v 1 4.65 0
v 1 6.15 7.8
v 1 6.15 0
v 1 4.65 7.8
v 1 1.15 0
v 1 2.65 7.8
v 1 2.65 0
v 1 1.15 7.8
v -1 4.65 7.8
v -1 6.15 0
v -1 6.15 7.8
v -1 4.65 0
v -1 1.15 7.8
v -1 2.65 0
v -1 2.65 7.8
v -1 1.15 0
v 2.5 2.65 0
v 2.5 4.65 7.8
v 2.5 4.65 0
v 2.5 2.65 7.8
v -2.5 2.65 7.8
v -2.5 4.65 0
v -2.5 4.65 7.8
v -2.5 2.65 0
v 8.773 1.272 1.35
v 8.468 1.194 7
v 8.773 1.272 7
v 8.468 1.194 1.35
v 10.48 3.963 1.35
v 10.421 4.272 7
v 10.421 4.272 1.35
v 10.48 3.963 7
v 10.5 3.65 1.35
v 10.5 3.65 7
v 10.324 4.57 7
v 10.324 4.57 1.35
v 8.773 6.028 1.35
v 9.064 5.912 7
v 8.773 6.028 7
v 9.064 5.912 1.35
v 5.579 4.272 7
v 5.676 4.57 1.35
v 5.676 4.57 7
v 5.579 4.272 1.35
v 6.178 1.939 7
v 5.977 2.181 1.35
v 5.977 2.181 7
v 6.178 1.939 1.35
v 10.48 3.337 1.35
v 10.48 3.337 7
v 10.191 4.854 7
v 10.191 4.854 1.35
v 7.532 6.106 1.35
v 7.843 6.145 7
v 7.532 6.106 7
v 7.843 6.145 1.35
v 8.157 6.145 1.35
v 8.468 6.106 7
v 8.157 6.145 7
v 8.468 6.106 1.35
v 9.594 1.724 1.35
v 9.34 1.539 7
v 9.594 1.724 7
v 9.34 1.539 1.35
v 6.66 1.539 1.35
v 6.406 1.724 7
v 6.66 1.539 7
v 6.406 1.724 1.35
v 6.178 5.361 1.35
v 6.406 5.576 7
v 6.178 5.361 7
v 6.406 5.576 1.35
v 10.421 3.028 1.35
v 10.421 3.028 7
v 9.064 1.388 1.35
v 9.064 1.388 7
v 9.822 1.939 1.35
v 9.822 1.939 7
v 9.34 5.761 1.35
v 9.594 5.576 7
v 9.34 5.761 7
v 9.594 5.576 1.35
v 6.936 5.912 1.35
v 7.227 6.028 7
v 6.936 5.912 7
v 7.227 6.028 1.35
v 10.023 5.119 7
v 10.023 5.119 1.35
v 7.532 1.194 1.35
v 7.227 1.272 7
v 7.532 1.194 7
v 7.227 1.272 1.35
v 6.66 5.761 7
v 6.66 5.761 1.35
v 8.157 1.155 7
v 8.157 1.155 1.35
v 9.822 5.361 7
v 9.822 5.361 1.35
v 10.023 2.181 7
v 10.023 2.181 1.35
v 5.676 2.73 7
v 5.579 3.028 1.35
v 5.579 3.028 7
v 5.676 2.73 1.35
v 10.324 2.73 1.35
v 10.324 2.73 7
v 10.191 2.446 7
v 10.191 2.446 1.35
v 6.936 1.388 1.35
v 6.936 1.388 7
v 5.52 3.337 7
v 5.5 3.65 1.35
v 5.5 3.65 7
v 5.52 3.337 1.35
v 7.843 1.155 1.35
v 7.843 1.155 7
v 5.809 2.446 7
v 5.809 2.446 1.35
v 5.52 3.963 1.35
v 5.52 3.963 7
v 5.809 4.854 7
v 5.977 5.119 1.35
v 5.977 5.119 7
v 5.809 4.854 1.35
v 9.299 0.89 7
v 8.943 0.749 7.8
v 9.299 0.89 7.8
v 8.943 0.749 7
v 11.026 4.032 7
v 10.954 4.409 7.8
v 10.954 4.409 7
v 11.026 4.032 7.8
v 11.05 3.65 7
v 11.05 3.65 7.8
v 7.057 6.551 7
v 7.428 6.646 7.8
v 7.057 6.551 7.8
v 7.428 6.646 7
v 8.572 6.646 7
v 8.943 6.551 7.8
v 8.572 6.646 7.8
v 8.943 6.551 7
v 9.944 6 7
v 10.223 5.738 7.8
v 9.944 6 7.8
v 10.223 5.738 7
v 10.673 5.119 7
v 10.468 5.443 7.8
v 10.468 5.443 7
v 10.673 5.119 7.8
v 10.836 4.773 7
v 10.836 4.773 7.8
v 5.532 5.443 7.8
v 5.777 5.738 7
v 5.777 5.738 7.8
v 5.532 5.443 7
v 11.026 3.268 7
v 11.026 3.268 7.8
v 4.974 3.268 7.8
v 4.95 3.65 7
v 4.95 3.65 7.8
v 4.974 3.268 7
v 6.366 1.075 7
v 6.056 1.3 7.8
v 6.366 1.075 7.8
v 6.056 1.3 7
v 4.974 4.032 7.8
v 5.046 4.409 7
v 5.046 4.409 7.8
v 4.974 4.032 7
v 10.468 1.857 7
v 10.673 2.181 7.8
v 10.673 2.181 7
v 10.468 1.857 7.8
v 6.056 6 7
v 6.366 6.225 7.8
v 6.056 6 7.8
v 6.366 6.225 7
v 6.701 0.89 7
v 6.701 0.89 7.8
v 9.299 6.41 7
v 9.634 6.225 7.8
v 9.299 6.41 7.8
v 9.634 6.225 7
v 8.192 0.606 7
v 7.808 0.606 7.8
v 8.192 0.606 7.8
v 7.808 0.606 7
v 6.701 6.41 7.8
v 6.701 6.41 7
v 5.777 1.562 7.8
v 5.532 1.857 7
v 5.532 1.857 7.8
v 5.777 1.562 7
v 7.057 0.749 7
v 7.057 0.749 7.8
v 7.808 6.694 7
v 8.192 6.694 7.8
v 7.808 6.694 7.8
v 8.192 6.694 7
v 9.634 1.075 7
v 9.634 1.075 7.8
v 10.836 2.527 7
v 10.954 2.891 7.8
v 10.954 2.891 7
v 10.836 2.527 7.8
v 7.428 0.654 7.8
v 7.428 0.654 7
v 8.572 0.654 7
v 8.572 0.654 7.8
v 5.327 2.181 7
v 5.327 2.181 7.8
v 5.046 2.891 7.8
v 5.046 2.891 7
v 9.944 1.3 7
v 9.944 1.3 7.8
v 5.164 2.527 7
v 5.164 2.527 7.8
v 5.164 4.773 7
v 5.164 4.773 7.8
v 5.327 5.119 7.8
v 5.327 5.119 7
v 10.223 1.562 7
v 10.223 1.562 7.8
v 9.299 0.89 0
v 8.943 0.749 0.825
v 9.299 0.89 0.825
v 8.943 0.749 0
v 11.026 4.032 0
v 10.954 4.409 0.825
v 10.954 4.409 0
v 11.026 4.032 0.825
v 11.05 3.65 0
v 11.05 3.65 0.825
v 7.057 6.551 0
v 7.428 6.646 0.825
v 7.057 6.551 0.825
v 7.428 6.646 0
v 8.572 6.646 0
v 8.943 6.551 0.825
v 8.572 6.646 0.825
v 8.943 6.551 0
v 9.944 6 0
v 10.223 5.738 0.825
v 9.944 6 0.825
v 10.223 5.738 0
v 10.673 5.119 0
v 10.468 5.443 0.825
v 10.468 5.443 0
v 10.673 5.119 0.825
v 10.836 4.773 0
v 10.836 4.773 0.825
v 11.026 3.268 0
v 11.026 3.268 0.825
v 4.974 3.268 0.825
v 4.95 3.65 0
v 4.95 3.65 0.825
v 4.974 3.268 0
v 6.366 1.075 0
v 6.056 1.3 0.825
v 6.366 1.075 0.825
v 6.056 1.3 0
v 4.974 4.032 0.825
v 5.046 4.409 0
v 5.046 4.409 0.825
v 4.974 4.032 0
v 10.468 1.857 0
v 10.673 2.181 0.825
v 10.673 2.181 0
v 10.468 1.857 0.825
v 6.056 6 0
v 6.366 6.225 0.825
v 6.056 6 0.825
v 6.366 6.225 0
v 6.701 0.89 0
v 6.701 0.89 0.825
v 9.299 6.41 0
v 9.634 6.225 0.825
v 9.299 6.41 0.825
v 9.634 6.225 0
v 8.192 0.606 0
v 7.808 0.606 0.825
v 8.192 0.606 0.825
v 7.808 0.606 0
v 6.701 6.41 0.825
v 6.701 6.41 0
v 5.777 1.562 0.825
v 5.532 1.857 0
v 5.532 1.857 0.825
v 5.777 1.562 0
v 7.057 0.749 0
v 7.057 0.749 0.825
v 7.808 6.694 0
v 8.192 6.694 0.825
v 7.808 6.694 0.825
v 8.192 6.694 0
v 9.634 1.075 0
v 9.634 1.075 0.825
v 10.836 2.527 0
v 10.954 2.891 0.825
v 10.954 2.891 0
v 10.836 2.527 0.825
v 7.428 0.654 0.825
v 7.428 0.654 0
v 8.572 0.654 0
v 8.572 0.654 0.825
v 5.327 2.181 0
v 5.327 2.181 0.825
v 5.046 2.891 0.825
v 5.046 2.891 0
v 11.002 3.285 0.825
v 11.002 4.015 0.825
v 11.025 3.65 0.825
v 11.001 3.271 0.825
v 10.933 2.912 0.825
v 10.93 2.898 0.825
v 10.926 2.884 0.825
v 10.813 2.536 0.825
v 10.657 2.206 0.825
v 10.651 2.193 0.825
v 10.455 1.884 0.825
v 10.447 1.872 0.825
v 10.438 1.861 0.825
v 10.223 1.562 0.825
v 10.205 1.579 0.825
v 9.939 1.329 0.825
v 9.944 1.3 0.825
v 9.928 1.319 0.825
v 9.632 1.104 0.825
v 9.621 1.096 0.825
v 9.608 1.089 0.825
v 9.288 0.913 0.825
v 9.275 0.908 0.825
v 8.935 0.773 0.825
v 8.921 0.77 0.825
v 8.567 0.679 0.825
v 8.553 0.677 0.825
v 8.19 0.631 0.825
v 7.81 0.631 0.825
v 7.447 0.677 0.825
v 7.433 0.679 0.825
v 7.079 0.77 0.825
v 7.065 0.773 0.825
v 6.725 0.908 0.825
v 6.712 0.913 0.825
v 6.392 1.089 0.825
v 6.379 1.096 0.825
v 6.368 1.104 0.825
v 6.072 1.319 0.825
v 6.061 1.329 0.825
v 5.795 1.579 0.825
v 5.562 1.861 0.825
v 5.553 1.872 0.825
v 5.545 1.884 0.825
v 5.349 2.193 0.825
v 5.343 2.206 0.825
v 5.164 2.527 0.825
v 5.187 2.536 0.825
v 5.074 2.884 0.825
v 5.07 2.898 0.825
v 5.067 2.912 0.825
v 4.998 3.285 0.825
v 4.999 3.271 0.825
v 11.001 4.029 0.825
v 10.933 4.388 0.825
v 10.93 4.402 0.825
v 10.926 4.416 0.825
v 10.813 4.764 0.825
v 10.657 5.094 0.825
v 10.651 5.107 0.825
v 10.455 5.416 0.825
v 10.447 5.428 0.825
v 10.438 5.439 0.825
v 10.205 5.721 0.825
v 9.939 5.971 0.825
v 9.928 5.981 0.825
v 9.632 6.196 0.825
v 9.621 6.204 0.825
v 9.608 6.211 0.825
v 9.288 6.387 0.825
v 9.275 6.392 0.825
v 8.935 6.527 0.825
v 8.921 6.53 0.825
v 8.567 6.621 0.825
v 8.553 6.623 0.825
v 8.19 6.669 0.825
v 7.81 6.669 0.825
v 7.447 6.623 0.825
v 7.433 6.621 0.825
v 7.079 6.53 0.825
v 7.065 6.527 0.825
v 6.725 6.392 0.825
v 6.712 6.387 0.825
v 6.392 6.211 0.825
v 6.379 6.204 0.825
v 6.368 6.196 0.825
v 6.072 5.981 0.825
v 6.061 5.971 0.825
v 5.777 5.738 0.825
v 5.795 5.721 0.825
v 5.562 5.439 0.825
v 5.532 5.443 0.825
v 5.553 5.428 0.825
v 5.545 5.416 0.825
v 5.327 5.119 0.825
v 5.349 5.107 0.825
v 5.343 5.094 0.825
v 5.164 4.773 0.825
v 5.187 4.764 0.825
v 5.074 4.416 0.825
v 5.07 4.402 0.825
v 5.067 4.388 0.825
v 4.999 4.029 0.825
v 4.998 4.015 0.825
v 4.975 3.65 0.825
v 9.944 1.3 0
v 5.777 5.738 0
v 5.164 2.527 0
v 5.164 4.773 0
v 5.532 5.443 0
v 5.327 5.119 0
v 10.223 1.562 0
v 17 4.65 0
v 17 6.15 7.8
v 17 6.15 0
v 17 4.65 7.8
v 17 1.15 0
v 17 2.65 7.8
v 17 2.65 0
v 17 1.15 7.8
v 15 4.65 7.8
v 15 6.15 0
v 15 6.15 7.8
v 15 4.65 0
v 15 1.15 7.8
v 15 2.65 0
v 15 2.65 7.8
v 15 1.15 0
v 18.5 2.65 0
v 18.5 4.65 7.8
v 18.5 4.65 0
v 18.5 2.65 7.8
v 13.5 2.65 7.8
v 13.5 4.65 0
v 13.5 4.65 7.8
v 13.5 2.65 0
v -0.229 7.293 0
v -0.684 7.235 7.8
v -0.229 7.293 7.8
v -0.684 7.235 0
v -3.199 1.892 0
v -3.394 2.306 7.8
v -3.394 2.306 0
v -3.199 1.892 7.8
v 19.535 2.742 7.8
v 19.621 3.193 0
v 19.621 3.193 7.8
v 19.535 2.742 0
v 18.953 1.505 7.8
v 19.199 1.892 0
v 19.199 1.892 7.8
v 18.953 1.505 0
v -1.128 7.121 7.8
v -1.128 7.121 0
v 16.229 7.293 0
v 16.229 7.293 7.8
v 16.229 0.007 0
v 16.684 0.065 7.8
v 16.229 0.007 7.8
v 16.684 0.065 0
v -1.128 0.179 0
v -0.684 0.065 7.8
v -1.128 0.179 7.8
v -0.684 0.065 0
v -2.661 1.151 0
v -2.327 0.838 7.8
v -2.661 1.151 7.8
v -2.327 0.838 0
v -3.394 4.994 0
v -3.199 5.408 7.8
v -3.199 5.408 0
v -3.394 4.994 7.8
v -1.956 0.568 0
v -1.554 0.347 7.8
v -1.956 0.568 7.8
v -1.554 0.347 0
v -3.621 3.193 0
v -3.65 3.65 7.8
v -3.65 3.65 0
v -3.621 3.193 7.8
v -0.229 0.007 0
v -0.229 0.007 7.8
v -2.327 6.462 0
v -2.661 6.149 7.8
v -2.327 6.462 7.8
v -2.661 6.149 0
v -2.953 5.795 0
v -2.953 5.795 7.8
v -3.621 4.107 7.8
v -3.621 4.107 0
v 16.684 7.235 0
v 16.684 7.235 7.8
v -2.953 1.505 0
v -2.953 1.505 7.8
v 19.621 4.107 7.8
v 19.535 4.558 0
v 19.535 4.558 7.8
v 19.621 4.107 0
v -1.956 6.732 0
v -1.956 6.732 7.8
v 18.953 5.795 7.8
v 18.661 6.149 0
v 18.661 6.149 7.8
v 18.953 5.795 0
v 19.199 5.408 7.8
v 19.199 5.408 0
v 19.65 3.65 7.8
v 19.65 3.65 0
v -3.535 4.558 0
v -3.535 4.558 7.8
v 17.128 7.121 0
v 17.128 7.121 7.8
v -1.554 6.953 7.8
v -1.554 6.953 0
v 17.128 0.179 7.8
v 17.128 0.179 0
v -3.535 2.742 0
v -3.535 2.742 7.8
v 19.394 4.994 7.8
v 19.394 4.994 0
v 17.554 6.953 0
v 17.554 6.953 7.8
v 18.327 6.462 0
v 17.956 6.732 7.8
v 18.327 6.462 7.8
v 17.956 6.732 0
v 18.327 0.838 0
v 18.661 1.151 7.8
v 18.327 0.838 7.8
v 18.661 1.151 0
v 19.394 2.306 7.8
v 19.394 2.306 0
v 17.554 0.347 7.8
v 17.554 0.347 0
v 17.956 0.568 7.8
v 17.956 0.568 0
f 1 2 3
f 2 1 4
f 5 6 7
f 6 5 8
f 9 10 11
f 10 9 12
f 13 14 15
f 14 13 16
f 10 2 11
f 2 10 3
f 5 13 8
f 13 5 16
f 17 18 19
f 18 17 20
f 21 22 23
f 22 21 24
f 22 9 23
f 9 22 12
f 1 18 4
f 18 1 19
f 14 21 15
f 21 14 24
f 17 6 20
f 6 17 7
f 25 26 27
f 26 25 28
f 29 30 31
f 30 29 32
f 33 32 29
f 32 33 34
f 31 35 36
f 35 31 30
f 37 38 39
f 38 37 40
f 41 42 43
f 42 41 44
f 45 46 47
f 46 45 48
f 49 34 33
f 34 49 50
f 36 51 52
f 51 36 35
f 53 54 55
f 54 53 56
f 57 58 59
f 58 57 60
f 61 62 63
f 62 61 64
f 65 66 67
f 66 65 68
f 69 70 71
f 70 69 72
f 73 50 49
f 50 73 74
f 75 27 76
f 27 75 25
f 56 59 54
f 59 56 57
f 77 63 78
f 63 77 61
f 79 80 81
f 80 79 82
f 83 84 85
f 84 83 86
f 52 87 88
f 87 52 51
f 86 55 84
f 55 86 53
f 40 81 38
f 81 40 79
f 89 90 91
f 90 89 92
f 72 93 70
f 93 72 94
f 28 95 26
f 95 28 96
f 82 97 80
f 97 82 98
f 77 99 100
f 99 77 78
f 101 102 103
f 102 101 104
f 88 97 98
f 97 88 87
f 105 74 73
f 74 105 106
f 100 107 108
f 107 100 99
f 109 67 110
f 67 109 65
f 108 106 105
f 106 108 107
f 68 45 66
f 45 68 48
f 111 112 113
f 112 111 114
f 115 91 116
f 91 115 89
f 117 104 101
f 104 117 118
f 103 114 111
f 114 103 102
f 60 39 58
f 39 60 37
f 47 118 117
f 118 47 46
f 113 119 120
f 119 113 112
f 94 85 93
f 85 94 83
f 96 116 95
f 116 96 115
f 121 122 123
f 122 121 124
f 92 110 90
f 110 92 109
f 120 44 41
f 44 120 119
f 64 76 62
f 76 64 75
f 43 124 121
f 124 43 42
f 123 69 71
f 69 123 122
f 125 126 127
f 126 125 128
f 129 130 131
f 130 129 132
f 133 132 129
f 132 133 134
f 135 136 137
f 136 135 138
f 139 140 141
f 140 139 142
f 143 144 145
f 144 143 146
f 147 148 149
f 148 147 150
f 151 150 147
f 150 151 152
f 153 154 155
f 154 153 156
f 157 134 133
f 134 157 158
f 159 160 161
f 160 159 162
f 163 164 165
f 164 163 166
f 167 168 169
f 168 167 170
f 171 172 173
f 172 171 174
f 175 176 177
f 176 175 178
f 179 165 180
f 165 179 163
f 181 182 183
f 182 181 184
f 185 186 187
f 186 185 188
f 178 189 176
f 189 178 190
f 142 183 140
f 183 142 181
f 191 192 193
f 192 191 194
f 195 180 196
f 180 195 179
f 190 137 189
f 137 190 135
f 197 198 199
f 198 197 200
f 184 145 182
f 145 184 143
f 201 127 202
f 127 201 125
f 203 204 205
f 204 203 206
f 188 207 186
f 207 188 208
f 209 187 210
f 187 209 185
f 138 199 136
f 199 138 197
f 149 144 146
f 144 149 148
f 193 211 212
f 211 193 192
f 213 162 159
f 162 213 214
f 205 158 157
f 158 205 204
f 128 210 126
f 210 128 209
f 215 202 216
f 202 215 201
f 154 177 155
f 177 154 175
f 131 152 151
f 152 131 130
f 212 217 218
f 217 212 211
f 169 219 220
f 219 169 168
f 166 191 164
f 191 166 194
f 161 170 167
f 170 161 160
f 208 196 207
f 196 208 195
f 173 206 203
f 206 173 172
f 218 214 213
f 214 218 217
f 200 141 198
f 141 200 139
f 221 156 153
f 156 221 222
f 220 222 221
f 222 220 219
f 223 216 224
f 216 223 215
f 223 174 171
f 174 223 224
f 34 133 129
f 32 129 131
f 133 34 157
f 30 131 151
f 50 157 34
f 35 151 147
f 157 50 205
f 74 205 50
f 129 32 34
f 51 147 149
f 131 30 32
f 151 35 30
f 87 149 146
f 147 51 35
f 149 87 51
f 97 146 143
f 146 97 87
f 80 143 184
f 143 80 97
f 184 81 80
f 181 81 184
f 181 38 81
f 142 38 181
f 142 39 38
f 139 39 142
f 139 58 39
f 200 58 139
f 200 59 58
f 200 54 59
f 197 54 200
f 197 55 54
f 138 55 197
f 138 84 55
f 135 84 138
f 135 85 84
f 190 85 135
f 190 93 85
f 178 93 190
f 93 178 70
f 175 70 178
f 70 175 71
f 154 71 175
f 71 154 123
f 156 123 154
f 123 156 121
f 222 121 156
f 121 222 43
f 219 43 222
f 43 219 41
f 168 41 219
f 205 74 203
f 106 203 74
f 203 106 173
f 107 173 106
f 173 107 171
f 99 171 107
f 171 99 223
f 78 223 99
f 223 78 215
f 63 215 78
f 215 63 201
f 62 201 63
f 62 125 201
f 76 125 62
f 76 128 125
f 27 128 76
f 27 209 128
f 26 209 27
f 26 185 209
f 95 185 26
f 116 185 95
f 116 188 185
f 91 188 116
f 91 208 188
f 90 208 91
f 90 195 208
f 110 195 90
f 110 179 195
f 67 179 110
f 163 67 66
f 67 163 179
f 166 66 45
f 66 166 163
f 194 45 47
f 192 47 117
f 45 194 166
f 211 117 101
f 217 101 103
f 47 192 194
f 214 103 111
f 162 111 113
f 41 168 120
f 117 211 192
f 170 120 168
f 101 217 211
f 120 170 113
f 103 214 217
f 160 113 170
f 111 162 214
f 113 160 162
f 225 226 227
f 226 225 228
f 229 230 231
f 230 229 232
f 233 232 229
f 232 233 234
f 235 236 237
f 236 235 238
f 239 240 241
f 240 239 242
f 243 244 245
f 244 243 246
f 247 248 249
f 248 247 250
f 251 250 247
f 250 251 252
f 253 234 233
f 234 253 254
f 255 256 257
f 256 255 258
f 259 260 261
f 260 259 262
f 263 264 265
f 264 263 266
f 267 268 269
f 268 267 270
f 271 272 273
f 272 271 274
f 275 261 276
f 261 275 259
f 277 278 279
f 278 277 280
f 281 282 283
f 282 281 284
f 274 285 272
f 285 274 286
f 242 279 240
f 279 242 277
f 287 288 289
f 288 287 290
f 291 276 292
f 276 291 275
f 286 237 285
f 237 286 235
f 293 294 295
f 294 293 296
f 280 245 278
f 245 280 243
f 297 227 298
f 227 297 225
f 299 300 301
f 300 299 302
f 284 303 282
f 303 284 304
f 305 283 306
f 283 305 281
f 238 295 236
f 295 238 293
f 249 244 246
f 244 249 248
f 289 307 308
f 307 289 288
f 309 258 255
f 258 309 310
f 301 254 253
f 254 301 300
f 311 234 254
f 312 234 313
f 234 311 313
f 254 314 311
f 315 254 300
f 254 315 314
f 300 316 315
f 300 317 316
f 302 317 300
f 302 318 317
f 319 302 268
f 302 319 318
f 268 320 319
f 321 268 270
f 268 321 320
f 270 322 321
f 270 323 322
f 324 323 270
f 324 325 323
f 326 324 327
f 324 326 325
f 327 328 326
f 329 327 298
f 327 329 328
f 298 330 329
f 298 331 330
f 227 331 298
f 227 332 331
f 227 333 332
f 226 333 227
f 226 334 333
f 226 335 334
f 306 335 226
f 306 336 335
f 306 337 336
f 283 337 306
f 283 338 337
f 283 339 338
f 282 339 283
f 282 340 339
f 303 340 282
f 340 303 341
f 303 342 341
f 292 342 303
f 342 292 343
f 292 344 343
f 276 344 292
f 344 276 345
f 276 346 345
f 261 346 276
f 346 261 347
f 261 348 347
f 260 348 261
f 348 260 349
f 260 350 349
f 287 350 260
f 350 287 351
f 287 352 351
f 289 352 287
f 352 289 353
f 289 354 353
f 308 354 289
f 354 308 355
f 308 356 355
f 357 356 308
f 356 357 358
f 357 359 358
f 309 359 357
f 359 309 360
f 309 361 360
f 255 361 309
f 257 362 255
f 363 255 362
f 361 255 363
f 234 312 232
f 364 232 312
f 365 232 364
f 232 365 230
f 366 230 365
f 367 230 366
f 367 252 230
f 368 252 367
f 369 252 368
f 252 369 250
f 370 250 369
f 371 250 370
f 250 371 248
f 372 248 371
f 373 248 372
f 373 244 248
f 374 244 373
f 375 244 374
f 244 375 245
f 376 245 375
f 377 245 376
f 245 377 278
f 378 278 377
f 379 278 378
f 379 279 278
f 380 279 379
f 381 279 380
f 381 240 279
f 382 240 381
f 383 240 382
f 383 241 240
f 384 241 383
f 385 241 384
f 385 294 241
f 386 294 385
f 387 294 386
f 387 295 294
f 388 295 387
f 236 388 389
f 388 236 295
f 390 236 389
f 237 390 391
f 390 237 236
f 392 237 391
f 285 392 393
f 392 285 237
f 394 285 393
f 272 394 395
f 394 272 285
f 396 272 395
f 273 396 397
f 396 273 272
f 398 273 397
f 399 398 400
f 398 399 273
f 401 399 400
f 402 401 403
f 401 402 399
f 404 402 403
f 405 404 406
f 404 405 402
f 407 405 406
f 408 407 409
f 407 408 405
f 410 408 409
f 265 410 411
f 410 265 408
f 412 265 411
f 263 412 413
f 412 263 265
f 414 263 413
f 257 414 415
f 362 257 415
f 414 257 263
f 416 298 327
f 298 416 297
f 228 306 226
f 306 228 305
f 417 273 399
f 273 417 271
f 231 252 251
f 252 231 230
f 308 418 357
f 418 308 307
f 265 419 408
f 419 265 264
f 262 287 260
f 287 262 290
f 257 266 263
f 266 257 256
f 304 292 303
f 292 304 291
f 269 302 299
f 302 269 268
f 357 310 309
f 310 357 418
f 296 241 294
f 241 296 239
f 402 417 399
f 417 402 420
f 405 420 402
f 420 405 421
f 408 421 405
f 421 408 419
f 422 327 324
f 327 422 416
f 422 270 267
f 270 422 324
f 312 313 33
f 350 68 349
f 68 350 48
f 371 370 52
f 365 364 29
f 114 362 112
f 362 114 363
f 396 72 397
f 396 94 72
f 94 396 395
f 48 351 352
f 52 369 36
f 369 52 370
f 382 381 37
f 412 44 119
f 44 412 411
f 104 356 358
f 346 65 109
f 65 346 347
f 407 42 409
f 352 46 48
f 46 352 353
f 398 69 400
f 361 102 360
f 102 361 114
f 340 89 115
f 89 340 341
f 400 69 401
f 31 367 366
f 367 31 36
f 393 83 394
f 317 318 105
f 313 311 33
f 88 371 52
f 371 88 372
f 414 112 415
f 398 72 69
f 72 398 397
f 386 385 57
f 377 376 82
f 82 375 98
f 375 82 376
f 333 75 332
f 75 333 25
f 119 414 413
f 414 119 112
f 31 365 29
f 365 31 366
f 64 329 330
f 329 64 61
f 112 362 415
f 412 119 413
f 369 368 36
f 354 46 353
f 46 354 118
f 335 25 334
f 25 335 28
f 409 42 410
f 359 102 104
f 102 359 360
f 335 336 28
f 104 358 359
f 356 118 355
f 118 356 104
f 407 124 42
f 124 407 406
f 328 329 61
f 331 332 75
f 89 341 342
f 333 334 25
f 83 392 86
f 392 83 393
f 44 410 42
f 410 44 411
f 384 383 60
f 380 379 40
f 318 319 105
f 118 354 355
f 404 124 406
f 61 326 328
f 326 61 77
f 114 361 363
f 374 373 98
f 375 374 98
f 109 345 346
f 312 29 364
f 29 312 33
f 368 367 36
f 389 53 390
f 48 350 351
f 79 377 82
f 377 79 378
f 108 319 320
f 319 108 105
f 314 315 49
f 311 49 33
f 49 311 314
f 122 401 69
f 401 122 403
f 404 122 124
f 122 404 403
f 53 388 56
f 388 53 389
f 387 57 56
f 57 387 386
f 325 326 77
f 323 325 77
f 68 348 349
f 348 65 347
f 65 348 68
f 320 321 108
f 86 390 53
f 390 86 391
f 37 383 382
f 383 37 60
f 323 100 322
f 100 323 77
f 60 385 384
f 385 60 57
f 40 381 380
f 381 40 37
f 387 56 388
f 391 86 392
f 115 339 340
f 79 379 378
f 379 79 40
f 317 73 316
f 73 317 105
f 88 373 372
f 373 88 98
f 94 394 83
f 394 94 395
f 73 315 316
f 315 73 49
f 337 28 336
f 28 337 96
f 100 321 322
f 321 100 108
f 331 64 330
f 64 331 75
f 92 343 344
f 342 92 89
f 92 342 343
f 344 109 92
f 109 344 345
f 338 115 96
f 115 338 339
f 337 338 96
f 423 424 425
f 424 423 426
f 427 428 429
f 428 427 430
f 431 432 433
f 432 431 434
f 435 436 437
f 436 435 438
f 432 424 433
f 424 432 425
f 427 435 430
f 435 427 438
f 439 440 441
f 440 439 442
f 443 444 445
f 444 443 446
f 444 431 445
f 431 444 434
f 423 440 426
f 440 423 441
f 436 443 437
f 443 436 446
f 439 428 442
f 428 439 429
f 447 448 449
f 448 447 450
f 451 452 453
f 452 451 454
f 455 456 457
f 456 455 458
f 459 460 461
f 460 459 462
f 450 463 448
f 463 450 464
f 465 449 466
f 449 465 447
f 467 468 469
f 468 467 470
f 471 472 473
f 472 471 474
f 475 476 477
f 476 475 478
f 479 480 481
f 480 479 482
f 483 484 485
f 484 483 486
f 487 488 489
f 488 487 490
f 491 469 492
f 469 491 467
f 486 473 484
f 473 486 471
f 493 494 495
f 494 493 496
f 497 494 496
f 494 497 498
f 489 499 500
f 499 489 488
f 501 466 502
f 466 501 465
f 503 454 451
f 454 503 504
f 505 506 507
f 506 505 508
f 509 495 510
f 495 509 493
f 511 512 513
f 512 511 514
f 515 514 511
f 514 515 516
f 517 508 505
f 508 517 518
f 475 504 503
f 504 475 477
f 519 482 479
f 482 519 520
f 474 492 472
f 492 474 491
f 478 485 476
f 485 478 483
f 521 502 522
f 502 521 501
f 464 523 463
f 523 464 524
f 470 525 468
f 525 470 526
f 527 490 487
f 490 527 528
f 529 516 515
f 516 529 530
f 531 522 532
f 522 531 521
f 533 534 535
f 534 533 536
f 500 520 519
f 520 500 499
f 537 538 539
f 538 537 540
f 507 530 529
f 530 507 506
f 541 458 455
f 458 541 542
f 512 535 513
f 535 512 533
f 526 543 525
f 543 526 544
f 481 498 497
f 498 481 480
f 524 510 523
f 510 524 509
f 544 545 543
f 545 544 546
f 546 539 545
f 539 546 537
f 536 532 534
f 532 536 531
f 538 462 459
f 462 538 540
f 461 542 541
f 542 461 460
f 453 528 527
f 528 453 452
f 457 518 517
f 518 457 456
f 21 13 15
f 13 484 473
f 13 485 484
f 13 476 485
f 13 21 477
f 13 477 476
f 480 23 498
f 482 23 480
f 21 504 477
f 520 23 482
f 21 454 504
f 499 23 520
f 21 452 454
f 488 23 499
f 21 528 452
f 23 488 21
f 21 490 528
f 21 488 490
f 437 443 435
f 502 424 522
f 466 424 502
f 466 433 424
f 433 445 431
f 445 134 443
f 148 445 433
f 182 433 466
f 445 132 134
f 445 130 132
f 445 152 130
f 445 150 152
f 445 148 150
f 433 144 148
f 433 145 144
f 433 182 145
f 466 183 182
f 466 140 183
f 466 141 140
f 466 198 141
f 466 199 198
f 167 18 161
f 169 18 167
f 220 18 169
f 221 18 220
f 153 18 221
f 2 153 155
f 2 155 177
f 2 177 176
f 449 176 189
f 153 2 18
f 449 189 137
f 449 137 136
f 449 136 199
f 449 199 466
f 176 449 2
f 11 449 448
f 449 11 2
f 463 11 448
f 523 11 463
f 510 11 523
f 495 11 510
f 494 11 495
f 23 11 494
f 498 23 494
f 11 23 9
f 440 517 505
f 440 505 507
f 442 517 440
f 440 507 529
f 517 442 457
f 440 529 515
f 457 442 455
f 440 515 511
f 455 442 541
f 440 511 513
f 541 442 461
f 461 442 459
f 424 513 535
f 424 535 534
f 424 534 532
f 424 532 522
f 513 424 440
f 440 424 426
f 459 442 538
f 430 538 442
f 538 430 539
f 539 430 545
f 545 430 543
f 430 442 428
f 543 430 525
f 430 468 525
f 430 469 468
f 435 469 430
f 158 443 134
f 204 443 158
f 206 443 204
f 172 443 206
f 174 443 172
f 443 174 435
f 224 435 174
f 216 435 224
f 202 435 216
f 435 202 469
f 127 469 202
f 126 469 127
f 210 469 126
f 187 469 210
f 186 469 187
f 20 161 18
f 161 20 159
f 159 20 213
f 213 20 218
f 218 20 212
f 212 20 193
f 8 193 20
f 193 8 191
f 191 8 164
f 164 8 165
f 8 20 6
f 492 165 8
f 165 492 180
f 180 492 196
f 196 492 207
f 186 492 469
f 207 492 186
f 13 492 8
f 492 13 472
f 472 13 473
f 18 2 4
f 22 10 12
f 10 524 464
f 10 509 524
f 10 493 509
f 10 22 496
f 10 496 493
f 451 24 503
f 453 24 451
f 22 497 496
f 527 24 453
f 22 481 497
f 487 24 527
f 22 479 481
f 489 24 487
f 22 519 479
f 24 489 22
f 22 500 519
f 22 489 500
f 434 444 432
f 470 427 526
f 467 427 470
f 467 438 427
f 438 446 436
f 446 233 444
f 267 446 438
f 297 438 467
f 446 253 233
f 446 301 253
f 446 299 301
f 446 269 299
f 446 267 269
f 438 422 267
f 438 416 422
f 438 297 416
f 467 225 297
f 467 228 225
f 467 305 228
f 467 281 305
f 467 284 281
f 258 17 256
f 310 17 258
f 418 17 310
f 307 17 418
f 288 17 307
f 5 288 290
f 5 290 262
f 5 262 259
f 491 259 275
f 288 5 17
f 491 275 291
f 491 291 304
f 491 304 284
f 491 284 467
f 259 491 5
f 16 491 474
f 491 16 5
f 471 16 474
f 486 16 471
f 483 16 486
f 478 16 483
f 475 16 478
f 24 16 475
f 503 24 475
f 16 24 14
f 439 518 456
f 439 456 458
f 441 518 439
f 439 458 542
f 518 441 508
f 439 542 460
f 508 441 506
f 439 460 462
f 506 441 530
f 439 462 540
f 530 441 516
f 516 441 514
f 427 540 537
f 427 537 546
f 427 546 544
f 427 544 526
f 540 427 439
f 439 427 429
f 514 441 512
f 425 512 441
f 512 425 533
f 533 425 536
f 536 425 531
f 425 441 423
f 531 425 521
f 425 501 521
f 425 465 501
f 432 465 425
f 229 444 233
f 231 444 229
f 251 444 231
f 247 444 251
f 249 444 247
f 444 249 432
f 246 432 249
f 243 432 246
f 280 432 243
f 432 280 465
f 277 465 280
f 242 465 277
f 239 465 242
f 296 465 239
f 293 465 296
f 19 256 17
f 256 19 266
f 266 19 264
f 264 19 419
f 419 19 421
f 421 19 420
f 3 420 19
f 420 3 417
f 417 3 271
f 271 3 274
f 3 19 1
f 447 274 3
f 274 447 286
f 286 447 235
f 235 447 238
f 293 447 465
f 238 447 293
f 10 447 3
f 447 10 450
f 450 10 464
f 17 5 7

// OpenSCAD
/*      
        Even More Customizable Straight LEGO Technic Beam
        Based on Customizable Straight LEGO Technic Beam
         and Parametric LEGO Technic Beam by "projunk" and "stevemedwin"
        www.thingiverse.com/thing:203935
        Modified by Sam Kass
        November 2015
*/

// user parameters
// Lowercase letter o for round hole, and + for a plus-shaped hole.
holes = "+o+";

// If true, piece will be half-height
half_height="false"; // [true, false]

/* [Hidden] */

$fn=50*1.0;

// Parameters modified for best print on my Replicator 2 with PLA
Pitch = 8*1.0;
Radius1 = 5.0/2;
Radius2 = 6.1/2;
Height = half_height=="true"?4.0:7.8*1.0;
Depth = 0.85*1.0;
Width = 7.3*1.0; 
Plus_Width = 2.0*1.0;

Overhang = 0.05*1.0;

module body()
{
    translate([0, Width/2, 0]) 
    hull() {
        cylinder(r=Width/2, h=Height);
        
        translate([(len(holes)-1)*Pitch, 0, 0]) 
            cylinder(r=Width/2, h=Height);
    }
}

module hole()
{
    union()
	{
        //core
        cylinder(r=Radius1,h=Height);
        
        //top countersink
        translate([0,0,Height-Depth+Overhang]) 
            cylinder(r=Radius2,h=Depth);
        
        //bottom countersink
        translate([0,0,-Overhang/2]) 
            cylinder(r=Radius2,h=Depth);
        
        translate([0,0,Depth-Overhang])
            cylinder(h=(Radius2 - Radius1), r1=Radius2, r2=Radius1);
    }
}

module plus() {

    union() {
        translate([-Plus_Width/2, -Radius1, -Overhang]) 
            cube([Plus_Width, Radius1*2, Height+Overhang*2]);
        translate([-Radius1, -Plus_Width/2, -Overhang]) 
            cube([Radius1*2, Plus_Width, Height+Overhang*2]);
    }
}

module drawBeam()
{
    difference()
    {
        body();
       
        for (i = [1:len(holes)])
        {
            if (holes[i-1] == "+")
                translate([(i-1)*Pitch, Width/2, 0])
                    plus();
            else if (holes[i-1] == "o")
                translate([(i-1)*Pitch, Width/2, 0])
                    hole();
            else if (holes[i-1] == "O")
                rotate([90,0,0])
                translate([(i-1)*Pitch, Width/2,-Pitch+Depth/2])
                    hole();
            else if (holes[i-1] == "P")
                rotate([90,0,0])
                translate([(i-1)*Pitch, Width/2,-Pitch+Depth/2])
                    plus();
            else if (holes[i-1] == "x") {}
            else
                translate([(i-1)*Pitch, Width/2, 0])
                    hole();
        }
    }
}

drawBeam();
